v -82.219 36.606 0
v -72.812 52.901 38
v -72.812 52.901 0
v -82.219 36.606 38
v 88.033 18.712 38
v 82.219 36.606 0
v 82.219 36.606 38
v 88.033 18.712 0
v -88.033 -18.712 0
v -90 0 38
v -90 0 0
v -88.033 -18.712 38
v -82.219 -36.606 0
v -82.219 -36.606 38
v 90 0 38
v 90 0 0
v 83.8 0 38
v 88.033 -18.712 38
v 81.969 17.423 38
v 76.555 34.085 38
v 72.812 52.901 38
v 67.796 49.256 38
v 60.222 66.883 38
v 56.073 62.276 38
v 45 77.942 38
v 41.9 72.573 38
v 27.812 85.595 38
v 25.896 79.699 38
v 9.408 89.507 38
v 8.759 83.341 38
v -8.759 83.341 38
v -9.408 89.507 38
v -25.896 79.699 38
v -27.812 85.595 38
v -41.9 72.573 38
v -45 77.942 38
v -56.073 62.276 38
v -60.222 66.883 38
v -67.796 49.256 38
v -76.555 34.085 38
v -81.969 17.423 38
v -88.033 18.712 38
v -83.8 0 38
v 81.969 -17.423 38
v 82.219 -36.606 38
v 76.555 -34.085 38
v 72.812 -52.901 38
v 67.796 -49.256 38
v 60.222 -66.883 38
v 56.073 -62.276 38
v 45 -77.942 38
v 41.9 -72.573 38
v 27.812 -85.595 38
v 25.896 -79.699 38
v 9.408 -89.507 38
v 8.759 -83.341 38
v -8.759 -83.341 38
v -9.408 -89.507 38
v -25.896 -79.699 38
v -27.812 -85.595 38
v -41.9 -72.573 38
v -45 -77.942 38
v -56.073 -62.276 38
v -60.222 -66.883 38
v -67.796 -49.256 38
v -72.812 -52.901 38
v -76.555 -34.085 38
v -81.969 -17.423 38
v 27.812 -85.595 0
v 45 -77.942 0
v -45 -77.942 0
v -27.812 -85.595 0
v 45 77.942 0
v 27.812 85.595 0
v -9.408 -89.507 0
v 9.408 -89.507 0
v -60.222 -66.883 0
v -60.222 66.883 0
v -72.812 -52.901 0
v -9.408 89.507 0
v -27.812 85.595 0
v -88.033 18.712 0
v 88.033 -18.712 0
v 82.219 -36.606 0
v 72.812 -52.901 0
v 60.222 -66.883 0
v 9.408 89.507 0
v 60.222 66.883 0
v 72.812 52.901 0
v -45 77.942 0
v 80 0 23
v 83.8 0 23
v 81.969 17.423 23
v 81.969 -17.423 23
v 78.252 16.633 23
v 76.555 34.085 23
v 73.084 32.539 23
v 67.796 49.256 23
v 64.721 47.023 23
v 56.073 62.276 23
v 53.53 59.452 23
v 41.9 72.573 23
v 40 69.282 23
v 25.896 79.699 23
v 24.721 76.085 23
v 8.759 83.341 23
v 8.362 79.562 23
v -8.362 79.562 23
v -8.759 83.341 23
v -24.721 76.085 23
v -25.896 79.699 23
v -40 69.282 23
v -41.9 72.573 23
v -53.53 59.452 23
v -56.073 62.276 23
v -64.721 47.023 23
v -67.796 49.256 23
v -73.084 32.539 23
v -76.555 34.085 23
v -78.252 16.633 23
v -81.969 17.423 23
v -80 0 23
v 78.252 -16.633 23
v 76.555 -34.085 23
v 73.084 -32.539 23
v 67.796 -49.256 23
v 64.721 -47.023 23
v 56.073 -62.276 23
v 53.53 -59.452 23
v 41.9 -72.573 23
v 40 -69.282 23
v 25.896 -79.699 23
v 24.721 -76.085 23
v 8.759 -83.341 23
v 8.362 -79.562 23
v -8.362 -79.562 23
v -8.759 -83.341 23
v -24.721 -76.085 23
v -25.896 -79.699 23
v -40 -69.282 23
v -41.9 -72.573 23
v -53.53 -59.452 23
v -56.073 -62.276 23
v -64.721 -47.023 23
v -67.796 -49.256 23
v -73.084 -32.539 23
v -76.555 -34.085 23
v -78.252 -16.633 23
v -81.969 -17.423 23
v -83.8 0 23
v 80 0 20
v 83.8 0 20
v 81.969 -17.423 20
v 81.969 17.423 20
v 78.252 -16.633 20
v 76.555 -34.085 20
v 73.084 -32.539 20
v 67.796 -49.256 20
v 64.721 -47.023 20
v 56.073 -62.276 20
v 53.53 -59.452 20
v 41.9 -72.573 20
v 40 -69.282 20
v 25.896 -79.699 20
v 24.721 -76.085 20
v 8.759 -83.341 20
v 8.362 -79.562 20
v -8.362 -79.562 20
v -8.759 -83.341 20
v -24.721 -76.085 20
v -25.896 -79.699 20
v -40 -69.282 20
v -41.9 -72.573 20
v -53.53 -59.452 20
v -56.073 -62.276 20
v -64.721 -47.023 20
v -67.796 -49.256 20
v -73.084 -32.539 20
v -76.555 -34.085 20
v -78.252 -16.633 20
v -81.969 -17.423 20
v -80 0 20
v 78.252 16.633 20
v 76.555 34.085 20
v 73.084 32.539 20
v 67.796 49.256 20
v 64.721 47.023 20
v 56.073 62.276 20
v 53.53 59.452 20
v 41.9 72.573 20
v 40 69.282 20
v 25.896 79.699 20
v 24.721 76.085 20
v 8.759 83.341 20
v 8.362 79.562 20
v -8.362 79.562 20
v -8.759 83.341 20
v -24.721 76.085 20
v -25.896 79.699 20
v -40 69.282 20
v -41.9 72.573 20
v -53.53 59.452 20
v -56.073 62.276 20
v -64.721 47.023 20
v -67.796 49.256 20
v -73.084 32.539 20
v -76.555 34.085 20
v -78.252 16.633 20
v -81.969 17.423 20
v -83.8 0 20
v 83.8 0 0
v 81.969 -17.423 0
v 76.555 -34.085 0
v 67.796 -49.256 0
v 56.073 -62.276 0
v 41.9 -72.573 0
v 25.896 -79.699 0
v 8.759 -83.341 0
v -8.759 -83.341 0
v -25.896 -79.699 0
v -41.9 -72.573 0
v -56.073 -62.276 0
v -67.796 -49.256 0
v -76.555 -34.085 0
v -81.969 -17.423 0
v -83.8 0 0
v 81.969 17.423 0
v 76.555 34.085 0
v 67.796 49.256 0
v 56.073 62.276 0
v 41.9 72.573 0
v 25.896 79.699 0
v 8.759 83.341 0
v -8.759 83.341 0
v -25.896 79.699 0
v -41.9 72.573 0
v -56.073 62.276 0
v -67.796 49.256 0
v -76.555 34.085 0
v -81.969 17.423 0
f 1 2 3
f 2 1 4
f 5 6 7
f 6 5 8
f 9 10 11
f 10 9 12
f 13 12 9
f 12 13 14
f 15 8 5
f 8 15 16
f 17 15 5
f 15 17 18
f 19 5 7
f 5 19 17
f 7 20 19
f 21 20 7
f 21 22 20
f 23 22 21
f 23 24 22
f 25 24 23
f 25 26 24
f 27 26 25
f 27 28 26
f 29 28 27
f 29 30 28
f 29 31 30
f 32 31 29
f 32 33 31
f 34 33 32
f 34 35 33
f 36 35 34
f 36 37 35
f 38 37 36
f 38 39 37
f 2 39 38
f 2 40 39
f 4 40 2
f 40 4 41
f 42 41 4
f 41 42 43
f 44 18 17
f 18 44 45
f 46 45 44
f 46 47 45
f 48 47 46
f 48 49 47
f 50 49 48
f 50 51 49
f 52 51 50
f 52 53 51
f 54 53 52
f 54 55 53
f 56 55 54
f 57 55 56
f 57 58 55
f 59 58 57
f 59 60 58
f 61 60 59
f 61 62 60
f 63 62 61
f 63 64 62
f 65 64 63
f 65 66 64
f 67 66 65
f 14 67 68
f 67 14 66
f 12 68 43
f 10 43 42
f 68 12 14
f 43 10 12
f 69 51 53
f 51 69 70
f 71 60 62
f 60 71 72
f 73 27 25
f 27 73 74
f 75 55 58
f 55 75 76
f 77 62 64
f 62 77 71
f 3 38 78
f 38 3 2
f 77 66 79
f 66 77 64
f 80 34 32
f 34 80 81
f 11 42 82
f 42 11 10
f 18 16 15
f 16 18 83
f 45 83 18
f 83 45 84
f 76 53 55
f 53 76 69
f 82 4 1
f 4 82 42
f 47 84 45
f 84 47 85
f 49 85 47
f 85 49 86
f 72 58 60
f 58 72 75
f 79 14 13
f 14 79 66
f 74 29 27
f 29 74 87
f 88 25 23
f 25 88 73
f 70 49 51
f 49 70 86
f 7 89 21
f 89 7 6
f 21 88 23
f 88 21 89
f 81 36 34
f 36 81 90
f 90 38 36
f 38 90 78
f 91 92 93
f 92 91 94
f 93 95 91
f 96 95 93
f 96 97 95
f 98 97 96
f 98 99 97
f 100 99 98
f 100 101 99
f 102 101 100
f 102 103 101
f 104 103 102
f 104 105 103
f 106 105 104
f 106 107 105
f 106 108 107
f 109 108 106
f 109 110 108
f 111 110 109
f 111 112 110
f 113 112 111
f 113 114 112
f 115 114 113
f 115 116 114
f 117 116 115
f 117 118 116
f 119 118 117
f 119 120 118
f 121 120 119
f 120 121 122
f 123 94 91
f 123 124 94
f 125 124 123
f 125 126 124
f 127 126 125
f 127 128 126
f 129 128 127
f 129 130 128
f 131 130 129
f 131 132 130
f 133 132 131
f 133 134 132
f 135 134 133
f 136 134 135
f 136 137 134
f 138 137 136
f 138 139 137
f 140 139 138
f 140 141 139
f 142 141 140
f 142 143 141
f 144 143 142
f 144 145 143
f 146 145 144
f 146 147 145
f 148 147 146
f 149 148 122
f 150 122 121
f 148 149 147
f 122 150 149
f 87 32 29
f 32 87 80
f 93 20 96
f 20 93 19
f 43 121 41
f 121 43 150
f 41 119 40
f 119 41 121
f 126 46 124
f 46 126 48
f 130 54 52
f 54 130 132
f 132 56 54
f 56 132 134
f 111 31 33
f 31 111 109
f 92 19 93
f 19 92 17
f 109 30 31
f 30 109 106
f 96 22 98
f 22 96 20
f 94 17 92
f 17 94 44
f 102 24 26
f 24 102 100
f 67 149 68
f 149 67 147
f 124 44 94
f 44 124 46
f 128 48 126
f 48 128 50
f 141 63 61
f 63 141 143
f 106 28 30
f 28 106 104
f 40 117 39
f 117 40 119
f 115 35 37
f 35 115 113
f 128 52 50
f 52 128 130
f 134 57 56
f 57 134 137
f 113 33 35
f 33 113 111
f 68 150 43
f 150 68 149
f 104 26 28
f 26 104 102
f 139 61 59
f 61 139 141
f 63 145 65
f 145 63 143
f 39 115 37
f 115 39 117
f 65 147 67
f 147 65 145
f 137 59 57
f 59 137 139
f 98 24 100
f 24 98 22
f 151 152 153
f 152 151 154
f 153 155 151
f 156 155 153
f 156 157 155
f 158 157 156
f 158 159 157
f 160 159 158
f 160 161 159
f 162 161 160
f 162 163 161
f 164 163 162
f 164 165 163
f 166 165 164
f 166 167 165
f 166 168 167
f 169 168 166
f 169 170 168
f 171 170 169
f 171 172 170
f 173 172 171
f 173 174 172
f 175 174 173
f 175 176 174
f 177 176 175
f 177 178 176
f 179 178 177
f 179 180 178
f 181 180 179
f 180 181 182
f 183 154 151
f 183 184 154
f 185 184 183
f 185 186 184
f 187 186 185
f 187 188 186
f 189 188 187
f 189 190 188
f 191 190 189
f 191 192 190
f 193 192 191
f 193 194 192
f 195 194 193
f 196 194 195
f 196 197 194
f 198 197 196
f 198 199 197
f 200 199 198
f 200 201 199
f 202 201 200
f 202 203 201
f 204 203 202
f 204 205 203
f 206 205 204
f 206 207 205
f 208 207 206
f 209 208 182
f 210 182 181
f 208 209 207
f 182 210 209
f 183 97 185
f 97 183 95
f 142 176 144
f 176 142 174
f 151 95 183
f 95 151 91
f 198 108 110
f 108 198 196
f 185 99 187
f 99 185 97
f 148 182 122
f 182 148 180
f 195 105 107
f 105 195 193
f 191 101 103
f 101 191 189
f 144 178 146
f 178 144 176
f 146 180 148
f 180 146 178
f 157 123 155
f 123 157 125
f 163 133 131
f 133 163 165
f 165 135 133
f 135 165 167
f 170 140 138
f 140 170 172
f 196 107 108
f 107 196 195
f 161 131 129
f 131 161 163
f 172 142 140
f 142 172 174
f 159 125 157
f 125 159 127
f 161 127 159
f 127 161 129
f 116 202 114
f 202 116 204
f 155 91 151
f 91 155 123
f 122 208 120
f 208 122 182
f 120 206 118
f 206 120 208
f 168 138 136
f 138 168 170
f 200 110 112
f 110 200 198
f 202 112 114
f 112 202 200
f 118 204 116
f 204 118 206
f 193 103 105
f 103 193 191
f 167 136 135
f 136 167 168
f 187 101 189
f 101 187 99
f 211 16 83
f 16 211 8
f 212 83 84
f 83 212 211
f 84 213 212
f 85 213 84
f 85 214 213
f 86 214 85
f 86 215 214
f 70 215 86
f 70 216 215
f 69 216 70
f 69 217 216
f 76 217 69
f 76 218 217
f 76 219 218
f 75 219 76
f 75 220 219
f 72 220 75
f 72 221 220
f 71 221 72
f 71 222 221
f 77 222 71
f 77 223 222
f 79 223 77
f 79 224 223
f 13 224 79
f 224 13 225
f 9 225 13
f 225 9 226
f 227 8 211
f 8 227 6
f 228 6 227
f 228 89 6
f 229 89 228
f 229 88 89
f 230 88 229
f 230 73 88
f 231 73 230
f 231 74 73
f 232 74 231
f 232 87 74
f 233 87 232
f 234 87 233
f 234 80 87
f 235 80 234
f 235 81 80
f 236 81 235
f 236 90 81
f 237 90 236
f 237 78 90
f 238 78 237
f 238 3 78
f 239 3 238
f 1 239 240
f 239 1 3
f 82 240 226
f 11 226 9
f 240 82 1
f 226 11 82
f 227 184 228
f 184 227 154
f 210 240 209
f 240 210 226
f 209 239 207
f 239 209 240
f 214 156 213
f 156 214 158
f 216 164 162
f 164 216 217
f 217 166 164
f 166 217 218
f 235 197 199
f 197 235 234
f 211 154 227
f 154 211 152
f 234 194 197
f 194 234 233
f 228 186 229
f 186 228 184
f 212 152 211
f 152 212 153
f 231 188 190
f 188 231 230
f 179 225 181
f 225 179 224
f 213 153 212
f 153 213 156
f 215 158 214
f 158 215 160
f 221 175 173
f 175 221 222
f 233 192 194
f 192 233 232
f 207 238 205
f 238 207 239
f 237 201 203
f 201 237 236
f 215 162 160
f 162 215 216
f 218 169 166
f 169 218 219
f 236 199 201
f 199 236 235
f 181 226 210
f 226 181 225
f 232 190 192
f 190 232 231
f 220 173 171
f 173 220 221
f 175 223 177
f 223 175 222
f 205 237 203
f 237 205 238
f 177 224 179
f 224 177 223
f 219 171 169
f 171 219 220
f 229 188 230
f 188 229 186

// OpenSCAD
translate([0,0,23])
difference (){
linear_extrude(15) circle (90);
linear_extrude(15) circle (83.8);}

translate([0,0,20]) difference (){
 linear_extrude(3) circle (90);
 linear_extrude(3) circle (80);
}

difference (){
linear_extrude(20) circle (90);
linear_extrude(20) circle (83.8);}
